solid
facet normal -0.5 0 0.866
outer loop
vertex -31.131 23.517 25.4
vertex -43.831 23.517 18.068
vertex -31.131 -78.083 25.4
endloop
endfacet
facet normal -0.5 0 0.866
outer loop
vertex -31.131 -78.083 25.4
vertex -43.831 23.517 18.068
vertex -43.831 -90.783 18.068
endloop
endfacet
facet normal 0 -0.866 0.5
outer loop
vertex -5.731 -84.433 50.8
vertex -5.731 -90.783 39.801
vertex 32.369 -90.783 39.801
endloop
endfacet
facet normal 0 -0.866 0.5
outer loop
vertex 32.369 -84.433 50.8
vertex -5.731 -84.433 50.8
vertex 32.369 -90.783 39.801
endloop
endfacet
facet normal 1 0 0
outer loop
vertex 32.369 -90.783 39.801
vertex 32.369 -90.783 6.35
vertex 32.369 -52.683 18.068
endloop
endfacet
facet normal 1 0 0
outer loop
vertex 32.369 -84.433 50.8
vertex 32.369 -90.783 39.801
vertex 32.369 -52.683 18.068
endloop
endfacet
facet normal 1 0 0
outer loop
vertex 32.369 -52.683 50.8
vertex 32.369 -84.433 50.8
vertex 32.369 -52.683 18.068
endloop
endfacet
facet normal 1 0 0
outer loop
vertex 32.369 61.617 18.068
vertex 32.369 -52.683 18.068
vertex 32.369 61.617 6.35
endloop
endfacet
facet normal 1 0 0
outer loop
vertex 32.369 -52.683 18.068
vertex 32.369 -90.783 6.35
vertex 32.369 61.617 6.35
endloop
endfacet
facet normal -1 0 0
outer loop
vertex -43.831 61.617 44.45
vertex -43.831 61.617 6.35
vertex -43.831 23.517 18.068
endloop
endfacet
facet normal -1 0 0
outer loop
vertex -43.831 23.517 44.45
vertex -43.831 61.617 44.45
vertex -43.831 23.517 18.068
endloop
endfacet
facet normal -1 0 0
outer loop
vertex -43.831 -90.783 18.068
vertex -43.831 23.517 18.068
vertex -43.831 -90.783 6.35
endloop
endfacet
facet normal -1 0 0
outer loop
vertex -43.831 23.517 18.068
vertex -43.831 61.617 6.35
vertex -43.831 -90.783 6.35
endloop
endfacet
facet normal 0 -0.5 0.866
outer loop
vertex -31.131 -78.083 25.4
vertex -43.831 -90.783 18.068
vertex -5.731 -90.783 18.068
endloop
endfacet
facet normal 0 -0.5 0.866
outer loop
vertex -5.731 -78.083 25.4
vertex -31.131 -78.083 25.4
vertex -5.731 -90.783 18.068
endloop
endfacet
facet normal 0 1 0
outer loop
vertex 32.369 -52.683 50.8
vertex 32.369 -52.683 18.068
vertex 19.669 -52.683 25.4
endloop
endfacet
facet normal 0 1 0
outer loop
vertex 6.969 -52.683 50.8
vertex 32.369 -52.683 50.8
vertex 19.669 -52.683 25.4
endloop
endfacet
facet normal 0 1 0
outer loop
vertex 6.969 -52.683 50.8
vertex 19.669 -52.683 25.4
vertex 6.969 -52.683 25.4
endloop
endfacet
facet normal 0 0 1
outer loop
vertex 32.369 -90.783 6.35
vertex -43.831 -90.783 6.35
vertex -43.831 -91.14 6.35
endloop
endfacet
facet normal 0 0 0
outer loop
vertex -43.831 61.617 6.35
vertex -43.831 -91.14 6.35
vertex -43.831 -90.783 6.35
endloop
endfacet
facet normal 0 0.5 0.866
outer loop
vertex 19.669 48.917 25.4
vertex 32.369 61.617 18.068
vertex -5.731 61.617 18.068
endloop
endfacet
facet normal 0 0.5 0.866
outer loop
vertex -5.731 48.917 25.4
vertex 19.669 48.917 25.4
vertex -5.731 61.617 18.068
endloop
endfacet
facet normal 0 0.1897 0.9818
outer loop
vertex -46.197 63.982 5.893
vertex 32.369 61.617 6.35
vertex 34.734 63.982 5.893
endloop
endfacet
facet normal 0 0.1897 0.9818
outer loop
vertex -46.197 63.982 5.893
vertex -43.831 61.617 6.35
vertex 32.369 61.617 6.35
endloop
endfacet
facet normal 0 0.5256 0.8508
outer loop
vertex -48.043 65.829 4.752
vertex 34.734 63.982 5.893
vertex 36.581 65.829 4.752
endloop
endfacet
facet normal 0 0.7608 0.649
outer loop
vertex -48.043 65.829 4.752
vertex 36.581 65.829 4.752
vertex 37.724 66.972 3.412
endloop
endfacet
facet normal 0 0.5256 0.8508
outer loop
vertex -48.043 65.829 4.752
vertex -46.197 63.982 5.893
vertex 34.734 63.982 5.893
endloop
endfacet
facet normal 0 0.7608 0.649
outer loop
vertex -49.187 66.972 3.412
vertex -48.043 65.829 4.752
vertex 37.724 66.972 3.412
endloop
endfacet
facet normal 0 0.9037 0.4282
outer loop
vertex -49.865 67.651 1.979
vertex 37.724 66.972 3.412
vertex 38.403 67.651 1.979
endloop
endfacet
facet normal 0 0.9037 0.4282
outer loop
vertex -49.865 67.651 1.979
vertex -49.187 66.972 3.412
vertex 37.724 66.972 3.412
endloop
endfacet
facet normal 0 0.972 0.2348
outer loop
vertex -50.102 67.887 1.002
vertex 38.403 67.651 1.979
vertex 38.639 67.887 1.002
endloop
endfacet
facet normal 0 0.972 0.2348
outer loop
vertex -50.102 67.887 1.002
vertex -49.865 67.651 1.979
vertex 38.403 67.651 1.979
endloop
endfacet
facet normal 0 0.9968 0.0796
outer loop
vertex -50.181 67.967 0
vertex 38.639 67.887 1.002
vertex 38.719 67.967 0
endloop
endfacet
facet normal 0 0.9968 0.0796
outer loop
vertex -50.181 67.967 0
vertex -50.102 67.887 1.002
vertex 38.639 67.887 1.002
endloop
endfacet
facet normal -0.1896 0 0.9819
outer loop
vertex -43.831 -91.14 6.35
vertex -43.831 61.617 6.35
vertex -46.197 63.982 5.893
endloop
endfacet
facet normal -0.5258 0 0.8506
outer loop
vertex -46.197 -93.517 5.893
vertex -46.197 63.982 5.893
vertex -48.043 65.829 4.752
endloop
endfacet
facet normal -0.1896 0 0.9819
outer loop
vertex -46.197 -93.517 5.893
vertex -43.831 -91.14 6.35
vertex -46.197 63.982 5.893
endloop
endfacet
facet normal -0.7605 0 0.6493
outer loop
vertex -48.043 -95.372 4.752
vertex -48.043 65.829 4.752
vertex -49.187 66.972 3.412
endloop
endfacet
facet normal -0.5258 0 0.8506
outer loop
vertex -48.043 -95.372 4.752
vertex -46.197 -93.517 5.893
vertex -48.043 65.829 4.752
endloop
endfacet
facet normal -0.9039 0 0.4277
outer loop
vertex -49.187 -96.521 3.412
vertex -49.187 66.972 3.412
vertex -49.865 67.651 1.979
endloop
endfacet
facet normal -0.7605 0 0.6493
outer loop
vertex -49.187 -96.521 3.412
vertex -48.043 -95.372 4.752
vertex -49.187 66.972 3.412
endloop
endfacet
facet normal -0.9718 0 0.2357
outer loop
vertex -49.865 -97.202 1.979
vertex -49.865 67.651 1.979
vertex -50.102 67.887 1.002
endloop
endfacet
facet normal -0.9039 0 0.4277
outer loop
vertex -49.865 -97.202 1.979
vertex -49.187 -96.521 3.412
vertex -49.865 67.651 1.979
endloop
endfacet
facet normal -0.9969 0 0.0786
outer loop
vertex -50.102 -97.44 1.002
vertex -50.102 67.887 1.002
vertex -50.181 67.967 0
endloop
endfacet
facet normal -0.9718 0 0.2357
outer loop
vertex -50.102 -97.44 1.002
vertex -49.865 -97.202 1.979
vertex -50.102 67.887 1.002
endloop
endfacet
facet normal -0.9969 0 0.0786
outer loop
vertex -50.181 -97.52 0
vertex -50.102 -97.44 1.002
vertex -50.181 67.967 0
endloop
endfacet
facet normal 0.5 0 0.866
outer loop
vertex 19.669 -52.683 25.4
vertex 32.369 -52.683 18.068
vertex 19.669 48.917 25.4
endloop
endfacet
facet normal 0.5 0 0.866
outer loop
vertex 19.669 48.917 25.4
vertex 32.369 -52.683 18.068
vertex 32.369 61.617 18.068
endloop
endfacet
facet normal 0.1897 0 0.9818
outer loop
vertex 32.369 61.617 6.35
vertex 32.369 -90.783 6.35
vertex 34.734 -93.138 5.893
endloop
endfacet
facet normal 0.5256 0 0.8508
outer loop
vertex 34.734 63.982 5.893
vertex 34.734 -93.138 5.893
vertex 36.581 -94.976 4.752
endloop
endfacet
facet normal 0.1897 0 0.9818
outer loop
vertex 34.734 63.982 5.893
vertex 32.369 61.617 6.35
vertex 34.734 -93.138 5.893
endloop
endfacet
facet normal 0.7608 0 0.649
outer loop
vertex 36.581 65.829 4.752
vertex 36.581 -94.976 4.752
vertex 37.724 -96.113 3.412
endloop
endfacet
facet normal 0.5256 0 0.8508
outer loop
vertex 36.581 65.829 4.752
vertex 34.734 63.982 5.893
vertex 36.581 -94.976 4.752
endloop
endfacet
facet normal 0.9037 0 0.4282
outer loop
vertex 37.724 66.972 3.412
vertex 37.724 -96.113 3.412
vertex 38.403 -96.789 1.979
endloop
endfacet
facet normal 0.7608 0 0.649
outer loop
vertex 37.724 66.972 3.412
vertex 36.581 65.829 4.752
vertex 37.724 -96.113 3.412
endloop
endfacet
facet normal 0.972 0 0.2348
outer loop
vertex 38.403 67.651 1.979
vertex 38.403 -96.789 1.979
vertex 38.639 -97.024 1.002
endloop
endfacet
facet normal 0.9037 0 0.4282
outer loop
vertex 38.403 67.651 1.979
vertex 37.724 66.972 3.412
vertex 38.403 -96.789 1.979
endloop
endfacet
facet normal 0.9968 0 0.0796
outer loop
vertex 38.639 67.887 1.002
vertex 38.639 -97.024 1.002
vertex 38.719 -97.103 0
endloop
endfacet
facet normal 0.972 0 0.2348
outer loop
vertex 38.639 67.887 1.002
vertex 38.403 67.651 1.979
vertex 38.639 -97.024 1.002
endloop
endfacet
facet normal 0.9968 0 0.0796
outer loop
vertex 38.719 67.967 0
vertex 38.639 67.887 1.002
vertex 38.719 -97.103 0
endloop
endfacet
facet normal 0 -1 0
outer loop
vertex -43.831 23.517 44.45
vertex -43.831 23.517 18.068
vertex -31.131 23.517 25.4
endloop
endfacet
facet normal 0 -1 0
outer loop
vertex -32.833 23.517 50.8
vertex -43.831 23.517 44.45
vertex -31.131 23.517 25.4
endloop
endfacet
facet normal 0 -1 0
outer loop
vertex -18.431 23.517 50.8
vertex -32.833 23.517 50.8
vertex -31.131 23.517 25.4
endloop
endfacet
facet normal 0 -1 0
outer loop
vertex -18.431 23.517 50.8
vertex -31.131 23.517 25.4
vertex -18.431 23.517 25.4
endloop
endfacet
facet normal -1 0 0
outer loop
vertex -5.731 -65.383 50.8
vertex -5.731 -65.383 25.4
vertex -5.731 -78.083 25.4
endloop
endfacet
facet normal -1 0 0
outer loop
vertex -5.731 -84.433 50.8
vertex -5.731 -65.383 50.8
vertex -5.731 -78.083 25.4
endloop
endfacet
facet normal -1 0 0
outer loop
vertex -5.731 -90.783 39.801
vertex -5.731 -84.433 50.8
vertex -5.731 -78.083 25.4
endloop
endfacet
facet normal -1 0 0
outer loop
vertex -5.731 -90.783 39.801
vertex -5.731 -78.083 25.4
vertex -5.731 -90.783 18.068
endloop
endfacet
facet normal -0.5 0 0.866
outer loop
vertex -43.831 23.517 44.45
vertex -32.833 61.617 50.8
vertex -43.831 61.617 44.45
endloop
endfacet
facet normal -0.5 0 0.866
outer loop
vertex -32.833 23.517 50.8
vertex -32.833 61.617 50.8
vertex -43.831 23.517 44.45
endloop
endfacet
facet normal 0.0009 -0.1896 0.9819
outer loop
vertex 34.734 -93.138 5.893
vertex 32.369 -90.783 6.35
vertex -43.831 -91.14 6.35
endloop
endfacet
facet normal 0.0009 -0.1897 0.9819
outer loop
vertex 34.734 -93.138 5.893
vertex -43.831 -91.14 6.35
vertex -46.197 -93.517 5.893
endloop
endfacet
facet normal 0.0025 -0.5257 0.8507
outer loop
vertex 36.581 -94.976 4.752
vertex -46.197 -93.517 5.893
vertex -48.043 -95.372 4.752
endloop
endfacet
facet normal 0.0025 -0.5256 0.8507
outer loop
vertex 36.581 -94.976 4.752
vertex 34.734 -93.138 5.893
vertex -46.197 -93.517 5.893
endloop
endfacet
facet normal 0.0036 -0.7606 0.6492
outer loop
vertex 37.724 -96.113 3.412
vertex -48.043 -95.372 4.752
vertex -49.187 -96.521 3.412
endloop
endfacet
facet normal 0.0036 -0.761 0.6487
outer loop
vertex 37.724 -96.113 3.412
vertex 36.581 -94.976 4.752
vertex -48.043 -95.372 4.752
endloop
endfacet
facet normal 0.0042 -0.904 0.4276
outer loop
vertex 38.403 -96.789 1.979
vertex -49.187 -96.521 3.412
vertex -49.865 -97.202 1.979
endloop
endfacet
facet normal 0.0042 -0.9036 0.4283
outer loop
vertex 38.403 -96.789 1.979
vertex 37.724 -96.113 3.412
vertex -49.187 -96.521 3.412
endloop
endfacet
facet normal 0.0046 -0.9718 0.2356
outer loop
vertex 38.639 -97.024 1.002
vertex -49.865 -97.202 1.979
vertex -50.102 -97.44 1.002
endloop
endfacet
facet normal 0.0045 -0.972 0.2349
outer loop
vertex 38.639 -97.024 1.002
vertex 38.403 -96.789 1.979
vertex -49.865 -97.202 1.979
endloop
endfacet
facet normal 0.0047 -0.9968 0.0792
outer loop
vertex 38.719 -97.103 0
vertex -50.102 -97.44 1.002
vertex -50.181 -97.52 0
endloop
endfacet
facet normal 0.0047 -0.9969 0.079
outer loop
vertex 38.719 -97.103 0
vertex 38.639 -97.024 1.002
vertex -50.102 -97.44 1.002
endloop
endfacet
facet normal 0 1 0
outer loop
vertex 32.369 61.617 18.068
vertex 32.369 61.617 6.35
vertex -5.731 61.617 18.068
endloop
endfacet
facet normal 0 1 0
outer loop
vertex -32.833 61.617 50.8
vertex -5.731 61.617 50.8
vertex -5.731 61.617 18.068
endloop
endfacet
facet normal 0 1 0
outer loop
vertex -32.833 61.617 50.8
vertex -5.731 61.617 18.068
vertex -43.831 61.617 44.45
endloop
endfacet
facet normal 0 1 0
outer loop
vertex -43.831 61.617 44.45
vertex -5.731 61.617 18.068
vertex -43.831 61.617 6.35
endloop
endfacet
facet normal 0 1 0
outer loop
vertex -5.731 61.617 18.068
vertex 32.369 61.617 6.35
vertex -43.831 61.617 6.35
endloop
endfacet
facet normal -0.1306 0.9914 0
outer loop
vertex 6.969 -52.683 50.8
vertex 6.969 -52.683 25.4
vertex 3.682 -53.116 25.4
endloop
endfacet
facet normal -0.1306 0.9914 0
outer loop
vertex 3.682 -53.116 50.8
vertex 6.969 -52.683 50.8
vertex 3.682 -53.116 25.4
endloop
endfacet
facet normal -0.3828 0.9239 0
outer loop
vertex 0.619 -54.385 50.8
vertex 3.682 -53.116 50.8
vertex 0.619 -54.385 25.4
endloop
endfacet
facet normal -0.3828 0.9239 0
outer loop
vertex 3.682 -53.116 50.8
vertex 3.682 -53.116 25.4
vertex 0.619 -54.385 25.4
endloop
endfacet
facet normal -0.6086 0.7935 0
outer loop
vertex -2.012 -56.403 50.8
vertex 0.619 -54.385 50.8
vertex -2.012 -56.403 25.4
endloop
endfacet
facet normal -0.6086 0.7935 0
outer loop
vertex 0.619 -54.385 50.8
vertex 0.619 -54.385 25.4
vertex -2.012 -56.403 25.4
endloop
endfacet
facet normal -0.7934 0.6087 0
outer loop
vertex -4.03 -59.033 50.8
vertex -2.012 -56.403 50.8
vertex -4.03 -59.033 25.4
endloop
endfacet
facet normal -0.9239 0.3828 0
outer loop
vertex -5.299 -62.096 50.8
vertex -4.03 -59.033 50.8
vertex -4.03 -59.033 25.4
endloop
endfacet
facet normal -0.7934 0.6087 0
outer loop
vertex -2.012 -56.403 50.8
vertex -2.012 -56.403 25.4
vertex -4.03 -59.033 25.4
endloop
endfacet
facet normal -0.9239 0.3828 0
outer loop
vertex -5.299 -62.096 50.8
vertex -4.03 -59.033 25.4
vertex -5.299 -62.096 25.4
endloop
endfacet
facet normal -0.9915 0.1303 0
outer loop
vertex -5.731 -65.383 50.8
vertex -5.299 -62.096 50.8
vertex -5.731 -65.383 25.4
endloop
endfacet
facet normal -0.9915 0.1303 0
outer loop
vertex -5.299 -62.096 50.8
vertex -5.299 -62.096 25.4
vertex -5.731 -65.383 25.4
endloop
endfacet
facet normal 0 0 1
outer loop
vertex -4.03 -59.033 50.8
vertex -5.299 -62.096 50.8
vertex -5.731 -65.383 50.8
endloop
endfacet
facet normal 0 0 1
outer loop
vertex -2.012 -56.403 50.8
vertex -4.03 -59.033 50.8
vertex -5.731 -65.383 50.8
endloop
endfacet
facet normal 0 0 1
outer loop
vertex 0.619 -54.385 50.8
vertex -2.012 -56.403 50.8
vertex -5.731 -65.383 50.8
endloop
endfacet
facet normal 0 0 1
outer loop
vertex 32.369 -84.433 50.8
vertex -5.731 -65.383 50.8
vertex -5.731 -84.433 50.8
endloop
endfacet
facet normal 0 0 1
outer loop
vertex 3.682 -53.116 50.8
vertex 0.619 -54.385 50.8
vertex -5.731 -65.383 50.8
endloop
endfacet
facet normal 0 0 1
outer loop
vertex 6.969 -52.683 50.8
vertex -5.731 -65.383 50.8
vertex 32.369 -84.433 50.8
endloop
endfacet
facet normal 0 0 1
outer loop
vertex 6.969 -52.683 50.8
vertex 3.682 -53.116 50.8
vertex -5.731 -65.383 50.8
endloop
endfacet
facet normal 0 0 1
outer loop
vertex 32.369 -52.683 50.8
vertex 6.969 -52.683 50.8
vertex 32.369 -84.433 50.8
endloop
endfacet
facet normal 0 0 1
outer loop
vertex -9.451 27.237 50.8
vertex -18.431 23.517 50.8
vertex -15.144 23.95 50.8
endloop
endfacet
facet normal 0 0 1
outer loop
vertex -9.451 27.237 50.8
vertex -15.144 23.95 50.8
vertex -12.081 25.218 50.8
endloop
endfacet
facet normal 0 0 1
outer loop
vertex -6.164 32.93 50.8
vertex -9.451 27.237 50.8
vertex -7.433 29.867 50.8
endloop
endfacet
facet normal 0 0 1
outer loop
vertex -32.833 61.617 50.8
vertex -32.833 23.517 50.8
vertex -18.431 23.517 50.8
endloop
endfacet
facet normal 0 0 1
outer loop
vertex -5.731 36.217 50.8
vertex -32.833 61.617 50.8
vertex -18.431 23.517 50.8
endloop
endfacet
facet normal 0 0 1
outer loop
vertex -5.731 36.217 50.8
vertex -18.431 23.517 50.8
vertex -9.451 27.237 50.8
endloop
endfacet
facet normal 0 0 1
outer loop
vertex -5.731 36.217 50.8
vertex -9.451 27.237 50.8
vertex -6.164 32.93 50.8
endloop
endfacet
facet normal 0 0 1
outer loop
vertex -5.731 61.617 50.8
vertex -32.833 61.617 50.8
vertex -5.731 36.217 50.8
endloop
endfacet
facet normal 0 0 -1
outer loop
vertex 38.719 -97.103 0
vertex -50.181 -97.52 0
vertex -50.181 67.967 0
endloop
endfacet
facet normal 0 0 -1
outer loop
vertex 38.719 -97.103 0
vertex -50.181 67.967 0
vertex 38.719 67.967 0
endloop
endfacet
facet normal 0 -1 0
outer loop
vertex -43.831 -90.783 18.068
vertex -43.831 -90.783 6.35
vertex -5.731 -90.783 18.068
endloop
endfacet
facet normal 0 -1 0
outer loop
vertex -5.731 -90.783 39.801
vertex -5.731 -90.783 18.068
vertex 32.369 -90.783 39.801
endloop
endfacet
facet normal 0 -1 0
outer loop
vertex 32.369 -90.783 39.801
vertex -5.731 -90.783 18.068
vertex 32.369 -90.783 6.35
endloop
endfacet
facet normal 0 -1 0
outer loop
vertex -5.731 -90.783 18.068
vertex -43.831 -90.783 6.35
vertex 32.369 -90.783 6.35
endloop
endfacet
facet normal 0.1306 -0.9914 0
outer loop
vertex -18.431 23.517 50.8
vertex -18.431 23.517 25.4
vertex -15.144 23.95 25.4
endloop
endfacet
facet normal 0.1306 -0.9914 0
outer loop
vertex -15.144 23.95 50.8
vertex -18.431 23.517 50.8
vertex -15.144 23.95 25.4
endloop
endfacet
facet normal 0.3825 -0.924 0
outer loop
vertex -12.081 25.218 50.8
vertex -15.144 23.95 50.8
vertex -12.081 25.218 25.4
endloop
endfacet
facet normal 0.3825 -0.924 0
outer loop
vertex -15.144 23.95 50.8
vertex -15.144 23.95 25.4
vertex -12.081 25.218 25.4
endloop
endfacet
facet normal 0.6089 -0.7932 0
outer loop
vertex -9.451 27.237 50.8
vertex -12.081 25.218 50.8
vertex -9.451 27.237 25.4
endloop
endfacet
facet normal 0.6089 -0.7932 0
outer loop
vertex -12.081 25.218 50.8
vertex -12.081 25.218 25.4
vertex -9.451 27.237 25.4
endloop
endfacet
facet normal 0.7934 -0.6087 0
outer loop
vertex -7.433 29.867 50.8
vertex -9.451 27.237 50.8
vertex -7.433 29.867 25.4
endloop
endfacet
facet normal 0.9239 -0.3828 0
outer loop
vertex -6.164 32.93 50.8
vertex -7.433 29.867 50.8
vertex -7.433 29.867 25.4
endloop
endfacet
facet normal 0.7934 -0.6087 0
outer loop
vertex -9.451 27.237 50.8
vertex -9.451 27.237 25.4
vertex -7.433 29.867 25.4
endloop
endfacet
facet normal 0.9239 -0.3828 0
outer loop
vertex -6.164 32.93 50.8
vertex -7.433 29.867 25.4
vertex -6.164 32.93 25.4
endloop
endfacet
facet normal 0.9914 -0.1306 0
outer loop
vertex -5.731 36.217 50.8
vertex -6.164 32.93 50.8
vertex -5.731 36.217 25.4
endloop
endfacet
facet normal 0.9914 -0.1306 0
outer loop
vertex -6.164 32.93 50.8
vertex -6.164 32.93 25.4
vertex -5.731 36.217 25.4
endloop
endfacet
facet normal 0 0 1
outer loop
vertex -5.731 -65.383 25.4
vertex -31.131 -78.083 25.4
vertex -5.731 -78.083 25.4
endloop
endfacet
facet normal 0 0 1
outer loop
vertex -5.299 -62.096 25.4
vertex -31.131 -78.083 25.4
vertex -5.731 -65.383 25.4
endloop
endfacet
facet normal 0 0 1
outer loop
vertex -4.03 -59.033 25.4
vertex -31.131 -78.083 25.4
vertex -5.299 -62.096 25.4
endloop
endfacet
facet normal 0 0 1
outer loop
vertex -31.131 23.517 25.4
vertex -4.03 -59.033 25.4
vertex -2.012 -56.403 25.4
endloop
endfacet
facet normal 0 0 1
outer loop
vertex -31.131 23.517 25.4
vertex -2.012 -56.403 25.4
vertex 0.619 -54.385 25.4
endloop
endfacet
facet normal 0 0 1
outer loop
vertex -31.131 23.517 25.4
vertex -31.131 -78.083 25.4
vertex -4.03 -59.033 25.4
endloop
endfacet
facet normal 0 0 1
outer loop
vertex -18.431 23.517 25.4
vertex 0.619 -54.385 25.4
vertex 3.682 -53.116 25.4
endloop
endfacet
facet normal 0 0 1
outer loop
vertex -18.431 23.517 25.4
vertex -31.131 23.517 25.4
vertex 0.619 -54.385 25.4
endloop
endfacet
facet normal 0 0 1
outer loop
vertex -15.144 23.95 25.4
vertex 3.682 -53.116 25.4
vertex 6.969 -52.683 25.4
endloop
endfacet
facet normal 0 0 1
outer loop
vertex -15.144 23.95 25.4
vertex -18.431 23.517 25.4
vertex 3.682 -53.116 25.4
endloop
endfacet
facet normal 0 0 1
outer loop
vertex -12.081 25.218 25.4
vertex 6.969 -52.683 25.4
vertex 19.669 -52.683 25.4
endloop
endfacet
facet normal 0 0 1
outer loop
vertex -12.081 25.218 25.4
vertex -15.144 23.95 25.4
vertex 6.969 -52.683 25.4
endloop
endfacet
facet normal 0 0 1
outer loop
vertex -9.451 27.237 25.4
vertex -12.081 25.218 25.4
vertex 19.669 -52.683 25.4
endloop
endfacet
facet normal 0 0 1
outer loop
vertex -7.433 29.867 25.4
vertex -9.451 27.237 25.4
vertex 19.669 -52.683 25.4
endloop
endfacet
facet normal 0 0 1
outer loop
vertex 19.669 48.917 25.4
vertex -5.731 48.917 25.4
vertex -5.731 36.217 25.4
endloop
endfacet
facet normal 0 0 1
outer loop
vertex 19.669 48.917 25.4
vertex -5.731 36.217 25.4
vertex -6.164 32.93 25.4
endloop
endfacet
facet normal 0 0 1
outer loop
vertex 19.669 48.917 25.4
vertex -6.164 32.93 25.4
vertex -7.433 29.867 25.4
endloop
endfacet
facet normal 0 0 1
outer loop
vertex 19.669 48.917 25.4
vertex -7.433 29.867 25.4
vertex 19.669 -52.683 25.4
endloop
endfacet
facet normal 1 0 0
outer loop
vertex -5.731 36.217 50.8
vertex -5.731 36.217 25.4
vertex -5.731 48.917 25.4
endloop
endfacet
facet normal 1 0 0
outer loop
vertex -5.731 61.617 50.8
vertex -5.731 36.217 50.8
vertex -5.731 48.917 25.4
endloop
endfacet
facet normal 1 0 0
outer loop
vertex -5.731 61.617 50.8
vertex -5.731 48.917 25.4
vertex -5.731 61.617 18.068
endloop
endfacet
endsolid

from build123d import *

# Parameters (mm, degrees)
F1_DEPTH   = 6.35
F2_DEPTH   = 25.4
F3_DEPTH   = 50.8
F4_SIZE2   = 10.9985226281
F4_SIZE    = 6.35
F4_2_SIZE2 = 10.9985226281
F4_2_SIZE  = 6.35
F5_SIZE2   = 7.3323484187
F5_SIZE    = 12.7
F6_R       = 6.34999


# Not quite as in the source:
# - a fillet or chamfer is up to 0.001 mm smaller than in the source, because OpenCascade refuses the exact size


with BuildPart() as f1:
    # F0 (on Top) → F1 (new body)
    with BuildSketch(Plane.XY):
        Polygon((-50.1812659204, 67.9668266764), (-50.1812659204, -97.5199052306), (38.7187340796, -97.1034997316), (38.7187340796, 67.9668266764), align=None)
        Polygon((-5.7312659204, -90.7831733236), (-43.8312659204, -90.7831733236), (-43.8312659204, 23.5168266764), (-43.8312659204, 61.6168266764), (-5.7312659204, 61.6168266764), (32.3687340796, 61.6168266764), (32.3687340796, -52.6831733236), (32.3687340796, -90.7831733236), align=None, mode=Mode.SUBTRACT)
    extrude(amount=F1_DEPTH)

    # F0 (on Top) → F2 (join)
    with BuildSketch(Plane.XY):
        with BuildLine():
            Line((-43.8312659204, 23.5168266764), (-43.8312659204, -90.7831733236))
            Line((-43.8312659204, -90.7831733236), (-5.7312659204, -90.7831733236))
            Line((-5.7312659204, -90.7831733236), (-5.7312659204, -65.3831733236))
            ThreePointArc((-5.7312659204, -65.3831733236), (-2.0115220415, -56.4029172025), (6.9687340796, -52.6831733236))
            Line((6.9687340796, -52.6831733236), (32.3687340796, -52.6831733236))
            Line((32.3687340796, -52.6831733236), (32.3687340796, 61.6168266764))
            Line((32.3687340796, 61.6168266764), (-5.7312659204, 61.6168266764))
            Line((-5.7312659204, 61.6168266764), (-5.7312659204, 36.2168266764))
            ThreePointArc((-5.7312659204, 36.2168266764), (-9.4510097993, 27.2365705553), (-18.4312659204, 23.5168266764))
            Line((-18.4312659204, 23.5168266764), (-43.8312659204, 23.5168266764))
        make_face()
    extrude(amount=F2_DEPTH)

    # F0 (on Top) → F3 (join)
    with BuildSketch(Plane.XY):
        with BuildLine():
            Line((-43.8312659204, 61.6168266764), (-43.8312659204, 23.5168266764))
            Line((-43.8312659204, 23.5168266764), (-18.4312659204, 23.5168266764))
            ThreePointArc((-18.4312659204, 23.5168266764), (-9.4510097993, 27.2365705553), (-5.7312659204, 36.2168266764))
            Line((-5.7312659204, 36.2168266764), (-5.7312659204, 61.6168266764))
            Line((-5.7312659204, 61.6168266764), (-43.8312659204, 61.6168266764))
        make_face()
        with BuildLine():
            Line((-5.7312659204, -65.3831733236), (-5.7312659204, -90.7831733236))
            Line((-5.7312659204, -90.7831733236), (32.3687340796, -90.7831733236))
            Line((32.3687340796, -90.7831733236), (32.3687340796, -52.6831733236))
            Line((32.3687340796, -52.6831733236), (6.9687340796, -52.6831733236))
            ThreePointArc((6.9687340796, -52.6831733236), (-2.0115220415, -56.4029172025), (-5.7312659204, -65.3831733236))
        make_face()
    extrude(amount=F3_DEPTH)

    # F4
    f4_edges = [f1.edges().sort_by_distance(p)[0] for p in [
        (13.318734, -90.783173, 50.8),
    ]]
    f4_side = f1.faces().sort_by_distance((13.714776, -72.129216, 50.8))[0]
    chamfer(f4_edges, length=F4_SIZE, length2=F4_SIZE2, reference=f4_side)

    # F4#2
    f4_2_edges = [f1.edges().sort_by_distance(p)[0] for p in [
        (-43.831266, 42.566827, 50.8),
    ]]
    f4_2_side = f1.faces().sort_by_distance((-43.831266, -0.295673, 21.43125))[0]
    chamfer(f4_2_edges, length=F4_2_SIZE, length2=F4_2_SIZE2, reference=f4_2_side)

    # F5
    f5_edges = [f1.edges().sort_by_distance(p)[0] for p in [
        (32.368734, 4.466827, 25.4),
        (-24.781266, -90.783173, 25.4),
        (-43.831266, -33.633173, 25.4),
        (13.318734, 61.616827, 25.4),
    ]]
    f5_side = f1.faces().sort_by_distance((-5.731266, -14.583173, 25.4))[0]
    chamfer(f5_edges, length=F5_SIZE, length2=F5_SIZE2, reference=f5_side)

    # F6 (radius 6.35 in the source; OpenCascade refuses exactly that, so slightly less here)
    f6_edges = [f1.edges().sort_by_distance(p)[0] for p in [
        (38.718734, -14.568337, 6.35),
        (-5.731266, -97.311702, 6.35),
        (-5.731266, 67.966827, 6.35),
        (-50.181266, -14.776539, 6.35),
    ]]
    fillet(f6_edges, radius=F6_R)


solid = f1.part
